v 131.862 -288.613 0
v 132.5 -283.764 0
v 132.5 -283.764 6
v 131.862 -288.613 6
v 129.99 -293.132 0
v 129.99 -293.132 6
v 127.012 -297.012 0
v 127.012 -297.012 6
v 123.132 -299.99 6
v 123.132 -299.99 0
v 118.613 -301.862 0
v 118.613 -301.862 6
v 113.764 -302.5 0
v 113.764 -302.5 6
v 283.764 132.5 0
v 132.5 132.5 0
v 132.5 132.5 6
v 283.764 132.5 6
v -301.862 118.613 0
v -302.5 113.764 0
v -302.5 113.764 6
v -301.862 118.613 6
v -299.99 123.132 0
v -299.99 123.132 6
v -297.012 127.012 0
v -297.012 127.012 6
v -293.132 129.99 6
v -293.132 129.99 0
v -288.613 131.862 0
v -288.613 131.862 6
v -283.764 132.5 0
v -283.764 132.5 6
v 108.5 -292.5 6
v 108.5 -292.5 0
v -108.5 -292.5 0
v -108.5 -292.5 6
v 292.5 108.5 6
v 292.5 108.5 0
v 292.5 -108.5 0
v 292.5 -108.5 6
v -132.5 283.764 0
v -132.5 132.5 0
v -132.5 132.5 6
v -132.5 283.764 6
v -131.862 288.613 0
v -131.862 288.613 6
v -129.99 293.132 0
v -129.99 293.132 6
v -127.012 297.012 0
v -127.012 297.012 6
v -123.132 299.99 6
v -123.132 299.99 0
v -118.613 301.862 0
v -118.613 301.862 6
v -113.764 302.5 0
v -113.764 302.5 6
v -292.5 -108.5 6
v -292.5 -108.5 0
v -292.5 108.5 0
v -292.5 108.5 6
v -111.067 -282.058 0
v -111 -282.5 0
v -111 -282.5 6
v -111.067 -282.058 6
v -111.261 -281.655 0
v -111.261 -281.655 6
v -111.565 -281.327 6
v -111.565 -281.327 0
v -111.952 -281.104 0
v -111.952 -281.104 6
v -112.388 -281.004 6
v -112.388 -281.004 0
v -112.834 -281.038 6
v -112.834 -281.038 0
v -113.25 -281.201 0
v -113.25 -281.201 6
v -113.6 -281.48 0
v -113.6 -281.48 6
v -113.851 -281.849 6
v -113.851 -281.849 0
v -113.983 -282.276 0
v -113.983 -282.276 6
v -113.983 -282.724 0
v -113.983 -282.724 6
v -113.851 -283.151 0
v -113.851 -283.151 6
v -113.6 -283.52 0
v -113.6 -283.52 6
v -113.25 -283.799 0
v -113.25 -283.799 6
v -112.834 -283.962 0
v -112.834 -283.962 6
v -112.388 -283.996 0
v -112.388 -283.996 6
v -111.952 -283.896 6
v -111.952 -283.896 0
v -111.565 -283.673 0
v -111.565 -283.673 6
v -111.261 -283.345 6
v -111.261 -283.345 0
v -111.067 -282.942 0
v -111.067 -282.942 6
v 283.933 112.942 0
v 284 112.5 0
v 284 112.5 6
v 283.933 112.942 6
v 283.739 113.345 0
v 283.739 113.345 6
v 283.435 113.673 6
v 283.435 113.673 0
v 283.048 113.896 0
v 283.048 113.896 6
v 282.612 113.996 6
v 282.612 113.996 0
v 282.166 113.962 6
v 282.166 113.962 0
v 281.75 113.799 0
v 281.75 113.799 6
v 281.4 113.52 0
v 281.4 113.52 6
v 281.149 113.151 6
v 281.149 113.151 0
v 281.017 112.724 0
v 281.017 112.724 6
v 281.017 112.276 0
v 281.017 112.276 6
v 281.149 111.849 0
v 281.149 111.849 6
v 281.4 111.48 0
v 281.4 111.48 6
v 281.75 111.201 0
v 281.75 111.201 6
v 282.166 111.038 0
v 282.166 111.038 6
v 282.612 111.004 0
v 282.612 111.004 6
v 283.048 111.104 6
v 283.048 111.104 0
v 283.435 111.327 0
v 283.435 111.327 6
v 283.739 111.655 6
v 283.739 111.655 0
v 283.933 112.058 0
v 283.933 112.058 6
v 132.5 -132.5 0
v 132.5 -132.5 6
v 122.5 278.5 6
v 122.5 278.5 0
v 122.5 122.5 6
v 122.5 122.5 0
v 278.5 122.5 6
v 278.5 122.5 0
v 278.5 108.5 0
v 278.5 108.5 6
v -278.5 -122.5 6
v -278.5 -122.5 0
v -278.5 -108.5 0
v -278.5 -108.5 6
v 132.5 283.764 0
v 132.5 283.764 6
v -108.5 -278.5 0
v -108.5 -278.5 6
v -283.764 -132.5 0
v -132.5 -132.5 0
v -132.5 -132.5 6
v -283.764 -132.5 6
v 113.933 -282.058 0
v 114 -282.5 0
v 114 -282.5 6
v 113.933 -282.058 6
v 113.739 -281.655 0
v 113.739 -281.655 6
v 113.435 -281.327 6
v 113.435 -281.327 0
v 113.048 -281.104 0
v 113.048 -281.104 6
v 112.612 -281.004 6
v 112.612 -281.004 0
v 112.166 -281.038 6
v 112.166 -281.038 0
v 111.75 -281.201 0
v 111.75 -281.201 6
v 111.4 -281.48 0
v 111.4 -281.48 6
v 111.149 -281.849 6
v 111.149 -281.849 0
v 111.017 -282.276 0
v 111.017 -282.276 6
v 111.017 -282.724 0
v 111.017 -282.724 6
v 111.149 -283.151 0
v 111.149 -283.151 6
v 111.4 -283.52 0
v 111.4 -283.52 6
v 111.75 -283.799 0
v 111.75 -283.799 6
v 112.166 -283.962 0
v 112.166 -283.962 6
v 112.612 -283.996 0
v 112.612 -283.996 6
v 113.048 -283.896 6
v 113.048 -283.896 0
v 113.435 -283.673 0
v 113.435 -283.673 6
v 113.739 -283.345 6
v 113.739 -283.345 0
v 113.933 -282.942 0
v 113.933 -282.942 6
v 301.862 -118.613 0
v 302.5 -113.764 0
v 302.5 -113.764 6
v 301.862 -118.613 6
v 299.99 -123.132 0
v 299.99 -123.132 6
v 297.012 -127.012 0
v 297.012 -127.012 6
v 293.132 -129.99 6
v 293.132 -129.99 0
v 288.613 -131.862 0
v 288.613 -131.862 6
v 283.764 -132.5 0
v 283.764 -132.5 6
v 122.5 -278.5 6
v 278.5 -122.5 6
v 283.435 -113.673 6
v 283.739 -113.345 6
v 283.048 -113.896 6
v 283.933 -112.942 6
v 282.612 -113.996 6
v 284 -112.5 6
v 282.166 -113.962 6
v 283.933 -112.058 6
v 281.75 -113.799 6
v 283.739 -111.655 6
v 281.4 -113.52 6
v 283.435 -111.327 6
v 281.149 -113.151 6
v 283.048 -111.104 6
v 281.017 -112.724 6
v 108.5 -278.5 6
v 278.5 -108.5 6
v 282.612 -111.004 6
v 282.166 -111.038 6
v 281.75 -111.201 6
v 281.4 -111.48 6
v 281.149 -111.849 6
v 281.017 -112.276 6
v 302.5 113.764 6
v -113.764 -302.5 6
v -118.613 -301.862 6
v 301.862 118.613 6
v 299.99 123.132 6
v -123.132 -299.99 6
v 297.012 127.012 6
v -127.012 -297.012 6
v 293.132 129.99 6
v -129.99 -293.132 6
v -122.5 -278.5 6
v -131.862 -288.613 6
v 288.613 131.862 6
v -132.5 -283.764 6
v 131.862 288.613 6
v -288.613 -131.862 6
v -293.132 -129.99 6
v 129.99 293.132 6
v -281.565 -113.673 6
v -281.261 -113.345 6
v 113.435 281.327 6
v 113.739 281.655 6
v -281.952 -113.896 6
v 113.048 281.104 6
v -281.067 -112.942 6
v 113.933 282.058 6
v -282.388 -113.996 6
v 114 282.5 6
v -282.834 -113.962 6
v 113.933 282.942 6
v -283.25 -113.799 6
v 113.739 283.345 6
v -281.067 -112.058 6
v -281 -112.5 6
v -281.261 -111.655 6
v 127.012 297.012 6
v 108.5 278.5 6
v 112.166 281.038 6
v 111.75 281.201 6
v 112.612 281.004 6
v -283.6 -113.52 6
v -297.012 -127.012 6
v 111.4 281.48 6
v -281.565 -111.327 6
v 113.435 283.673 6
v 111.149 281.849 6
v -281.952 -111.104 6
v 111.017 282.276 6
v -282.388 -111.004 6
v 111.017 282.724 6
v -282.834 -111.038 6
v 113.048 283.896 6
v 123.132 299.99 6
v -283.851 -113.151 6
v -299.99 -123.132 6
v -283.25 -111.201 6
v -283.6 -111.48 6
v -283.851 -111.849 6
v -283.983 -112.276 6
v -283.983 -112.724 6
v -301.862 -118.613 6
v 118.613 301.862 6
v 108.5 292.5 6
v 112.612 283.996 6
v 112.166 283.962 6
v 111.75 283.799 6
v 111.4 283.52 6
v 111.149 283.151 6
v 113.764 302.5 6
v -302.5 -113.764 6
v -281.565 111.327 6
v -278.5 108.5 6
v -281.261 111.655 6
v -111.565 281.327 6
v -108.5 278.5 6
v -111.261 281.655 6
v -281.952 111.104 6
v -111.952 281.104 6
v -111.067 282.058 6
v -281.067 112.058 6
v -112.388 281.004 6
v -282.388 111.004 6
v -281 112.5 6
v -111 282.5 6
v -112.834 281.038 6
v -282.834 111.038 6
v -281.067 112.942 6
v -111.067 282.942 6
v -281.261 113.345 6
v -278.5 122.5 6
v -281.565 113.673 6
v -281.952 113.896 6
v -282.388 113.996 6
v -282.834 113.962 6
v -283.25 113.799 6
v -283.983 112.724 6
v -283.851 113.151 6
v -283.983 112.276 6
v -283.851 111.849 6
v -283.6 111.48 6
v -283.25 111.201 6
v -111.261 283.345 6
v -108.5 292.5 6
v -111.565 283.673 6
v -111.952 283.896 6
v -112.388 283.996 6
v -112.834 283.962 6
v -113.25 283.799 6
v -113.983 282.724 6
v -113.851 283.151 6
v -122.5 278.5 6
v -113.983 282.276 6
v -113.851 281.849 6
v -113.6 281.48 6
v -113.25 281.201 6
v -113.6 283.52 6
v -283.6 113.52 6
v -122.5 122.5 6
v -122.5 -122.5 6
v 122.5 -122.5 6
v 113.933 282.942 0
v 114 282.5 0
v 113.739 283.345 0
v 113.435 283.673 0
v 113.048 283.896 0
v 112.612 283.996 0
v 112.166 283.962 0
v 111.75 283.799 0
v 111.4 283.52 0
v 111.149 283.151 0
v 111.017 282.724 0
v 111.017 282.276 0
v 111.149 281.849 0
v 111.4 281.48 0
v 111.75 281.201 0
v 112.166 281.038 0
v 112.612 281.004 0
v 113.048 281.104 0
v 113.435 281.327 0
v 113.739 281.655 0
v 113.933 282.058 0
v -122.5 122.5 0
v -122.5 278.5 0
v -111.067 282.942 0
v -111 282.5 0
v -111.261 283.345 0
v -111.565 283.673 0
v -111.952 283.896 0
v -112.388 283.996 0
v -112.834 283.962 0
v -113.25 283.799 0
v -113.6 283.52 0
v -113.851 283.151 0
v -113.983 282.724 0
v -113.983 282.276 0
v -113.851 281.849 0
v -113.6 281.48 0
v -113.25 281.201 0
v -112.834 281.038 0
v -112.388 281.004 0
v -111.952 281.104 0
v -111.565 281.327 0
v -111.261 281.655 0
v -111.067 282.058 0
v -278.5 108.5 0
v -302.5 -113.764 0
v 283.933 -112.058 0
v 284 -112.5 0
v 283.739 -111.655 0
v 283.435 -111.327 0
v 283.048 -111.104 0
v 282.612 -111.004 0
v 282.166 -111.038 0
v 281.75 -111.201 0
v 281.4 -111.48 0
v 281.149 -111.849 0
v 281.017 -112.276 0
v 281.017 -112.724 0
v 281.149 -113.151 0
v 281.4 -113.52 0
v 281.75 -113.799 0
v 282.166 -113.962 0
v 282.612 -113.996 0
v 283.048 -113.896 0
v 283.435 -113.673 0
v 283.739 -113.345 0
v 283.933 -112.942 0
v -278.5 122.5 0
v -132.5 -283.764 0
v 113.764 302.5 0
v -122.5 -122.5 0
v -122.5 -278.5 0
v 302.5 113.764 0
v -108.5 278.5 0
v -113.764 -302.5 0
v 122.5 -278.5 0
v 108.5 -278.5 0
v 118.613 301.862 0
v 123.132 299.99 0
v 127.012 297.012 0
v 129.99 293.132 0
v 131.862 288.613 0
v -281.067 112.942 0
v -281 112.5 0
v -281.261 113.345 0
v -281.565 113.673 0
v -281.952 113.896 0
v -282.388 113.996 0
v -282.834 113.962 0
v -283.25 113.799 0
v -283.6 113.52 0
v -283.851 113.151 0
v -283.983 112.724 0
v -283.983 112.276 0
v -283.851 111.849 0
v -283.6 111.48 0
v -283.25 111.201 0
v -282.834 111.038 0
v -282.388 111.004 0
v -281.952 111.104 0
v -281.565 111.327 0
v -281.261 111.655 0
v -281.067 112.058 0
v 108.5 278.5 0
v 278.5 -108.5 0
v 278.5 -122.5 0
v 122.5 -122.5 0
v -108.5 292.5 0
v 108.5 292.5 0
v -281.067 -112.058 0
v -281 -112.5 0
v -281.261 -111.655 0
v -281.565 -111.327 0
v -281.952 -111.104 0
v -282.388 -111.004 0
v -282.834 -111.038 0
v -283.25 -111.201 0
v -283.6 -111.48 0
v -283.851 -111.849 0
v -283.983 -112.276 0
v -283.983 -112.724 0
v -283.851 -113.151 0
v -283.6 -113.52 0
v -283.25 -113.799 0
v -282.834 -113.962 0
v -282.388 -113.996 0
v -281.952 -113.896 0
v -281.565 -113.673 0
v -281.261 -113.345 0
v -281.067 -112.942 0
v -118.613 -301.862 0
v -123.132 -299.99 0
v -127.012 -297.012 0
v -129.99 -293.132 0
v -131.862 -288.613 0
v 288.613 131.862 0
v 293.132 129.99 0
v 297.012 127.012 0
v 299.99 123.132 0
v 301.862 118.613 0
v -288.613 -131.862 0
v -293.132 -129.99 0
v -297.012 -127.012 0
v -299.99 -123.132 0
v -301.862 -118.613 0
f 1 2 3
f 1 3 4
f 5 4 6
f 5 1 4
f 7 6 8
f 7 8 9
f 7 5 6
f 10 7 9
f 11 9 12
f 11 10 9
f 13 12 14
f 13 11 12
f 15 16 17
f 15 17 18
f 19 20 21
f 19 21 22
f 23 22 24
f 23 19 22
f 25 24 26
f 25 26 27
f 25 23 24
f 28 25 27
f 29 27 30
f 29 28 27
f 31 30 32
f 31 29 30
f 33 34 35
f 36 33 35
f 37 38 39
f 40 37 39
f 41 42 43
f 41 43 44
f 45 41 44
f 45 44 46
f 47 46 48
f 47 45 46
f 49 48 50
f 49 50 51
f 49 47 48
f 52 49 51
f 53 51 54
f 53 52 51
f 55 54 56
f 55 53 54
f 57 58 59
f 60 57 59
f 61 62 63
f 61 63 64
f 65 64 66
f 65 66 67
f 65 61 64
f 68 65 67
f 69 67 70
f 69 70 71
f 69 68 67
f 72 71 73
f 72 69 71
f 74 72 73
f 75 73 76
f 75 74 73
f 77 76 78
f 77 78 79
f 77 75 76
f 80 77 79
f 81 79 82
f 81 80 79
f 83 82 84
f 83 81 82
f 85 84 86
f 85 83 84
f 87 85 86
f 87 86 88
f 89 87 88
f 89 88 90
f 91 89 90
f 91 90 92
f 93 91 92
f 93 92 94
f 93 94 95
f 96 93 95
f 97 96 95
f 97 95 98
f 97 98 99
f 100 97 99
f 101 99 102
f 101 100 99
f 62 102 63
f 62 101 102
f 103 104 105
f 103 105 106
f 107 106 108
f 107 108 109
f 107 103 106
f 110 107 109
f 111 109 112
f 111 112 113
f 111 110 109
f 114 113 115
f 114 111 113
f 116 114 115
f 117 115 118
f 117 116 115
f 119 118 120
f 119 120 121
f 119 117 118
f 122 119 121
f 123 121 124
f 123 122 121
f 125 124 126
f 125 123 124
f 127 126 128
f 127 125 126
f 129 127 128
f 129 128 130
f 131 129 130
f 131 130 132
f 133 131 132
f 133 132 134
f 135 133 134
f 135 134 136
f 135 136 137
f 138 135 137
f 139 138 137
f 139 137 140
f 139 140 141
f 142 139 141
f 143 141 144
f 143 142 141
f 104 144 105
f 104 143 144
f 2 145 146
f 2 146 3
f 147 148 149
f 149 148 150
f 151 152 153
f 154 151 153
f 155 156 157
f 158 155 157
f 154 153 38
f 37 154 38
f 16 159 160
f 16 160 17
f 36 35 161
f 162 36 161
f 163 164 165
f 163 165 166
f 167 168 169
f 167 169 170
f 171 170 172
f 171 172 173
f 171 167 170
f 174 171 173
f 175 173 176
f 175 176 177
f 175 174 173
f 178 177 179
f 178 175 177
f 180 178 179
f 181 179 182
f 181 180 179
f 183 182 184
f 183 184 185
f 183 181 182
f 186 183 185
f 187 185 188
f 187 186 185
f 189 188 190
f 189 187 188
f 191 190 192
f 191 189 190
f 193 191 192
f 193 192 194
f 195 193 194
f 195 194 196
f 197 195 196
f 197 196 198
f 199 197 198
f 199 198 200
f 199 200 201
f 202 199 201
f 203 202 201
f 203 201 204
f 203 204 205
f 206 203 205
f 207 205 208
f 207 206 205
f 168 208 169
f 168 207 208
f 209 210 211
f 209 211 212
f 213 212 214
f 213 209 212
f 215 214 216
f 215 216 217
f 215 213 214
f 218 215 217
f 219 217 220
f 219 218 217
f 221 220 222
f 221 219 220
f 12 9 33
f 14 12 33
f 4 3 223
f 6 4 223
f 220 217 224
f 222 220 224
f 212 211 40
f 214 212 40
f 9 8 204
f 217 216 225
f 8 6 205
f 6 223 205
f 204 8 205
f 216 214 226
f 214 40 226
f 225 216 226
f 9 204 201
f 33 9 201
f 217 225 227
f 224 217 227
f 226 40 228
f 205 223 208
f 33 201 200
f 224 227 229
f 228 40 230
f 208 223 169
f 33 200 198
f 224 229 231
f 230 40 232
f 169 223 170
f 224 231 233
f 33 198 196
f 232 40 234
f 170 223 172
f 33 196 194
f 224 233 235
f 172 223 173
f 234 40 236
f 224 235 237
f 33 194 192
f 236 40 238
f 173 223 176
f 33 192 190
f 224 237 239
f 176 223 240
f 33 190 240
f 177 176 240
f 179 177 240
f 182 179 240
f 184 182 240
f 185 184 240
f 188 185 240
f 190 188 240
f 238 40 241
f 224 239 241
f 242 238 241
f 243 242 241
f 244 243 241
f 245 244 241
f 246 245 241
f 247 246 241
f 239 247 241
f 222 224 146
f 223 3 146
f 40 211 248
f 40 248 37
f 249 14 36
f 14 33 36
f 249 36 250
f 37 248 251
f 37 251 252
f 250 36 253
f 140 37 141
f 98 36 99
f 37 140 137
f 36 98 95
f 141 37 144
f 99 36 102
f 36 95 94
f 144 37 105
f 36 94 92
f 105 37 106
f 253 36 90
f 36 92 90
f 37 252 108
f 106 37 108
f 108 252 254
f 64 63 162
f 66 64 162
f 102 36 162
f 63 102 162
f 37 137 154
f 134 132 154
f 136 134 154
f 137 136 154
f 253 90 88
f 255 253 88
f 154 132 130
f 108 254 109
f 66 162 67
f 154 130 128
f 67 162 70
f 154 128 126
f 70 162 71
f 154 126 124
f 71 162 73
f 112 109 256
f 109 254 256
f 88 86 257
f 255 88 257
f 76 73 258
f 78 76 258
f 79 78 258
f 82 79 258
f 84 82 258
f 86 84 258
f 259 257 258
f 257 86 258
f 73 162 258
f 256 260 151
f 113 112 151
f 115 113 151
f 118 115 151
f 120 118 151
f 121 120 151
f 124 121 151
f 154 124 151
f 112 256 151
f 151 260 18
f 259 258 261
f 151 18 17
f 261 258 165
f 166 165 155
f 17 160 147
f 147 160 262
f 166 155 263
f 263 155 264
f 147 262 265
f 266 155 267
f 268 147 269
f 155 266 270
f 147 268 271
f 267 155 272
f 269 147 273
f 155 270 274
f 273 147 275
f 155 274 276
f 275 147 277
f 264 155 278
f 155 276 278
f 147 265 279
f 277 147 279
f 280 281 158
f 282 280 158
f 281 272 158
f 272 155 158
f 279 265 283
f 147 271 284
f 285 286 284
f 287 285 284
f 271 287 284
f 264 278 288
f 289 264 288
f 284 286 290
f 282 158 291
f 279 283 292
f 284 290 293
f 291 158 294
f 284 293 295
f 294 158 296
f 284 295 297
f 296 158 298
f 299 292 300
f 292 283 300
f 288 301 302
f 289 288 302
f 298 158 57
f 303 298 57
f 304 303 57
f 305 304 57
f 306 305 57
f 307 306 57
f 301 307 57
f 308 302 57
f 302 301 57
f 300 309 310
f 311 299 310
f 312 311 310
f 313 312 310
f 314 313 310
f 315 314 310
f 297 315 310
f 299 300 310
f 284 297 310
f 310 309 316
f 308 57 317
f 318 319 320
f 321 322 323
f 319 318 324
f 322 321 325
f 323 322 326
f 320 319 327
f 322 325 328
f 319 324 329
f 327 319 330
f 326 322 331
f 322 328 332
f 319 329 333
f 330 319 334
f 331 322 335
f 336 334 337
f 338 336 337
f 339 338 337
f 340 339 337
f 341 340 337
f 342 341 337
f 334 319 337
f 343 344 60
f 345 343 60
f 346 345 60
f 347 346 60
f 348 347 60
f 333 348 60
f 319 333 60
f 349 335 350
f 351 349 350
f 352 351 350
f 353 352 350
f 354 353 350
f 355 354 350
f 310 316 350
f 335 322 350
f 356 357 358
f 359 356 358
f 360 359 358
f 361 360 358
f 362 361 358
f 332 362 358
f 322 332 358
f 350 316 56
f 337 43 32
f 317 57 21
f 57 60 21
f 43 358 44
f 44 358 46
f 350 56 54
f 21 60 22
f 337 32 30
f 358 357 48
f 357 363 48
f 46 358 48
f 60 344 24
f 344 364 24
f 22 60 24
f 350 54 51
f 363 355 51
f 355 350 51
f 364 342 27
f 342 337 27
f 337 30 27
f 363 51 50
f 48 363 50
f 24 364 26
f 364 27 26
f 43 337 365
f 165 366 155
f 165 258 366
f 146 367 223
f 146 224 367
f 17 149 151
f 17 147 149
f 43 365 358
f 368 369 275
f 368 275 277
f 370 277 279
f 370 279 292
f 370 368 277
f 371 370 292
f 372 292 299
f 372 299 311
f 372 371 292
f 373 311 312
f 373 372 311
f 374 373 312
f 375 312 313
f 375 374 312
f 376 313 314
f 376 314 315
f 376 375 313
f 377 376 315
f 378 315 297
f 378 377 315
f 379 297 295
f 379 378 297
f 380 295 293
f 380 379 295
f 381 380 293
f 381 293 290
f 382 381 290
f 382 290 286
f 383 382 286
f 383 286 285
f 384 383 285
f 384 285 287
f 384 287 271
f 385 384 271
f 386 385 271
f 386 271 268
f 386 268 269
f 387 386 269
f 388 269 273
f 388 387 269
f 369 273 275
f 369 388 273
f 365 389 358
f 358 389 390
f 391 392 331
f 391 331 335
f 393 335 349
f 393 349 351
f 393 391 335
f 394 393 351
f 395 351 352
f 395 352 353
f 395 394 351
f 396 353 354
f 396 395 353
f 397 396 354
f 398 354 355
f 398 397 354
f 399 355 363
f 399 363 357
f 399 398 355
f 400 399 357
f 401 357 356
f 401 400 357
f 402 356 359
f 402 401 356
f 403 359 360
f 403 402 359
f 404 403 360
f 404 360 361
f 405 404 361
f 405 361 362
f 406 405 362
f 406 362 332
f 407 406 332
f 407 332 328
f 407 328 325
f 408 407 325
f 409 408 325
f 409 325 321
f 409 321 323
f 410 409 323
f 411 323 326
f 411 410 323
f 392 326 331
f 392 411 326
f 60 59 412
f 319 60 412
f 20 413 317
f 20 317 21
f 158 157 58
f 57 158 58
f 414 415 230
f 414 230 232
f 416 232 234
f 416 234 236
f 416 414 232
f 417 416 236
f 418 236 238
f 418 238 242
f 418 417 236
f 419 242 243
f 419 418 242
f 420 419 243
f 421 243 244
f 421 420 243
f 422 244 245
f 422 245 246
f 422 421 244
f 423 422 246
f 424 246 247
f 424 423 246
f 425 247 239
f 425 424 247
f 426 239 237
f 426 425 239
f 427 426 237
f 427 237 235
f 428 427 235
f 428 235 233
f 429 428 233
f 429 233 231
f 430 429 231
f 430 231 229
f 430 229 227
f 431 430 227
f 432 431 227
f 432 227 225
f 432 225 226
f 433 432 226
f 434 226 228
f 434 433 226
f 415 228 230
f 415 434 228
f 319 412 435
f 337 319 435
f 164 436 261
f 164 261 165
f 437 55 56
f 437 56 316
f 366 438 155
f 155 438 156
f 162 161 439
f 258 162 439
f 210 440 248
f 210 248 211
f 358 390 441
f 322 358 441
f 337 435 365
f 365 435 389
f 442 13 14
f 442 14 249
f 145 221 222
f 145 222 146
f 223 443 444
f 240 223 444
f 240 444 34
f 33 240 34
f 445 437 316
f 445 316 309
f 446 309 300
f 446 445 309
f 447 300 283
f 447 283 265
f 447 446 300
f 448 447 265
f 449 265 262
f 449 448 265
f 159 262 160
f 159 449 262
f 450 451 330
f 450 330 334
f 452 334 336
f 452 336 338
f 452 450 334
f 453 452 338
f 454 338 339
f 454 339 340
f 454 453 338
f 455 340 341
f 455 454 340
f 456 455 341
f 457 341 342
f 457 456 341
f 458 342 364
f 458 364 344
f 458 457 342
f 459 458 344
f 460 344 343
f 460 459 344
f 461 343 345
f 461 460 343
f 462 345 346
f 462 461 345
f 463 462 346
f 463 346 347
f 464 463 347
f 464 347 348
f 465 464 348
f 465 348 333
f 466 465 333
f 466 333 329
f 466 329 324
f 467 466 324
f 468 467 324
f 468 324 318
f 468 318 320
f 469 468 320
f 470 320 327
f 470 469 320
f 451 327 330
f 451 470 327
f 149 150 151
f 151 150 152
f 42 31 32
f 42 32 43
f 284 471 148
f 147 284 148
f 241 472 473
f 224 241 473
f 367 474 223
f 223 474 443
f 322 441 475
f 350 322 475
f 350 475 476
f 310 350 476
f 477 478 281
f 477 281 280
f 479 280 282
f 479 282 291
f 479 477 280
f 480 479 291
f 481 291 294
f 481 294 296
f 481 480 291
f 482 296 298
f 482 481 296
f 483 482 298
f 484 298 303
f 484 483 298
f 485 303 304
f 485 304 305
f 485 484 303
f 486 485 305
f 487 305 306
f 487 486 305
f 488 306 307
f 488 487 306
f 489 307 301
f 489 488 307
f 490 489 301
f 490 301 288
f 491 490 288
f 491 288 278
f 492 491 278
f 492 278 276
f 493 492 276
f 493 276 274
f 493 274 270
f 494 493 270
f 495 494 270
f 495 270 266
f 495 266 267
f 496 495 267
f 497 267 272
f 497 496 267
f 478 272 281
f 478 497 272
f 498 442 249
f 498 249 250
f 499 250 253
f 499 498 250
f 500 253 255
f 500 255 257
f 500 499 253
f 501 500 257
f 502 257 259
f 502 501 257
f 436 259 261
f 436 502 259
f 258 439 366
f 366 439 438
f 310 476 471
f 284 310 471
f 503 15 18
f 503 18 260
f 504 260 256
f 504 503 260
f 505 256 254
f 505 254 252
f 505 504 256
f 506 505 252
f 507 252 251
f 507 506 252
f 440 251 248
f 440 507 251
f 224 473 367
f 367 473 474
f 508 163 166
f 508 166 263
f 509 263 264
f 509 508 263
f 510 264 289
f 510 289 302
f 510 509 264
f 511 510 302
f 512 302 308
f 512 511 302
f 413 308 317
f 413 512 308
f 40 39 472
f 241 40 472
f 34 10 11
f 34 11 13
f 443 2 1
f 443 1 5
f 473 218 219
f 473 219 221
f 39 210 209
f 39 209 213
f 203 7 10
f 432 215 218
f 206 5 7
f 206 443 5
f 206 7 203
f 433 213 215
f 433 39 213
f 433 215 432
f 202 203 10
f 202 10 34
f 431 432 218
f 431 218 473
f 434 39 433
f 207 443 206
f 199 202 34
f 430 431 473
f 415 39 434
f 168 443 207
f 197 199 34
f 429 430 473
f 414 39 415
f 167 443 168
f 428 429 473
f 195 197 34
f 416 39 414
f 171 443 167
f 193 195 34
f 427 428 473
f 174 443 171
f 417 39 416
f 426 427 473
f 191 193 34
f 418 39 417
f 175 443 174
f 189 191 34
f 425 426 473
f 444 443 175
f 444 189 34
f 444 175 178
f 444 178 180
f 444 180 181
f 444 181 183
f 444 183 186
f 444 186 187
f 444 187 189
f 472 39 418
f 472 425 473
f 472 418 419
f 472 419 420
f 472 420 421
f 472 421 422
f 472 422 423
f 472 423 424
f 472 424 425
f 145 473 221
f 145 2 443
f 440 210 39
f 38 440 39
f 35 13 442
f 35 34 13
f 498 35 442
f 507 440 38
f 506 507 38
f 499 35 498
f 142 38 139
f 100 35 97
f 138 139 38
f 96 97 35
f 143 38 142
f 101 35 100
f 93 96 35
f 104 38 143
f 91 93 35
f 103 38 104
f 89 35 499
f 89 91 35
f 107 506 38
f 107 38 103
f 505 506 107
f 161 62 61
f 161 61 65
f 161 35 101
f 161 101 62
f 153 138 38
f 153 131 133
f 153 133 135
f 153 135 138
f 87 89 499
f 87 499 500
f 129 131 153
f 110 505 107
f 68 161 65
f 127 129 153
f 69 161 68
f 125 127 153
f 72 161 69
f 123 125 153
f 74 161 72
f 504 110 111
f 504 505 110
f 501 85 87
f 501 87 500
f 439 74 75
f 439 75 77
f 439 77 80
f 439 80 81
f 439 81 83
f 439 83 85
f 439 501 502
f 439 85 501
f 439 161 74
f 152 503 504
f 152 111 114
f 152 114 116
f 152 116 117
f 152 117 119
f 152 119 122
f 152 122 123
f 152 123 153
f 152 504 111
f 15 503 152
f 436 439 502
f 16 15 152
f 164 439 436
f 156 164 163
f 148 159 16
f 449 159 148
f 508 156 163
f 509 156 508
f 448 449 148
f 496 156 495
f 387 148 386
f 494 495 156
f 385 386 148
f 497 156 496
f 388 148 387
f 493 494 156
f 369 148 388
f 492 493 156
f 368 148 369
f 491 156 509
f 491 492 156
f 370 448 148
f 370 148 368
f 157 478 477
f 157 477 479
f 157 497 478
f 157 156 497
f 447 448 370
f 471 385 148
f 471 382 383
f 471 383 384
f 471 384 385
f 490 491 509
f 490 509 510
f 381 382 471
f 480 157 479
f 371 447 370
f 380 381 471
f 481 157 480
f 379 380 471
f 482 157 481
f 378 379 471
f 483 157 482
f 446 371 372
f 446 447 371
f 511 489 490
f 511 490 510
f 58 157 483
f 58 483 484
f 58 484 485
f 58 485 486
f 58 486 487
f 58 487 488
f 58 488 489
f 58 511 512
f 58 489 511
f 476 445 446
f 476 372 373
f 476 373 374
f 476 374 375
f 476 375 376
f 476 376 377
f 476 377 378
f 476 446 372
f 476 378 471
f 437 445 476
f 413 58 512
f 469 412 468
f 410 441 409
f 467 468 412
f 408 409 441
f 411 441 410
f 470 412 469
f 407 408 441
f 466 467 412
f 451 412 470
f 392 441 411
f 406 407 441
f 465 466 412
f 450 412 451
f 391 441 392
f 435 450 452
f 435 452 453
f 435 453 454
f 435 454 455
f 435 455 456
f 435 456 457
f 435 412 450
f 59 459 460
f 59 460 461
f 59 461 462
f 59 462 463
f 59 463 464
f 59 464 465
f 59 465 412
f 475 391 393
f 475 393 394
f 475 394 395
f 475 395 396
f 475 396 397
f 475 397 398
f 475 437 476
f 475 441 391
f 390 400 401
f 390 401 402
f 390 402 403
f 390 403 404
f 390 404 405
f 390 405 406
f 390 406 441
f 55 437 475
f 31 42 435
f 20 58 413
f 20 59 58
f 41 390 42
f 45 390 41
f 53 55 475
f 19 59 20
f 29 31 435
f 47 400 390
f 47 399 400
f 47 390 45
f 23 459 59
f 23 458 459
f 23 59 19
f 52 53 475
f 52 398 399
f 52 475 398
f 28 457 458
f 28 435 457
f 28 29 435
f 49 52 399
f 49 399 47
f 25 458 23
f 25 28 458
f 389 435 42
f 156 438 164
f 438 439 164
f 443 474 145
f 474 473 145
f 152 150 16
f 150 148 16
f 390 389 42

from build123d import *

# Parameters (mm, degrees)
CROQUIS1_R              = 1.5
SALIENTE_EXTRUIR1_DEPTH = 6


with BuildPart() as part:
    # Croquis1 → Saliente-Extruir1 (new body)
    with BuildSketch(Plane.XY):
        with BuildLine():
            Line((-283.764, 132.5), (-132.5, 132.5))
            Line((-132.5, 132.5), (-132.5, 283.764))
            ThreePointArc((-132.5, 283.764), (-127.012352652, 297.012352652), (-113.764, 302.5))
            Line((-113.764, 302.5), (113.764, 302.5))
            ThreePointArc((113.764, 302.5), (127.012352652, 297.012352652), (132.5, 283.764))
            Line((132.5, 283.764), (132.5, 132.5))
            Line((132.5, 132.5), (283.764, 132.5))
            ThreePointArc((283.764, 132.5), (297.012352652, 127.012352652), (302.5, 113.764))
            Line((302.5, 113.764), (302.5, -113.764))
            ThreePointArc((302.5, -113.764), (297.012352652, -127.012352652), (283.764, -132.5))
            Line((283.764, -132.5), (132.5, -132.5))
            Line((132.5, -132.5), (132.5, -283.764))
            ThreePointArc((132.5, -283.764), (127.012352652, -297.012352652), (113.764, -302.5))
            Line((113.764, -302.5), (-113.764, -302.5))
            ThreePointArc((-113.764, -302.5), (-127.012352652, -297.012352652), (-132.5, -283.764))
            Line((-132.5, -283.764), (-132.5, -132.5))
            Line((-132.5, -132.5), (-283.764, -132.5))
            ThreePointArc((-283.764, -132.5), (-297.012352652, -127.012352652), (-302.5, -113.764))
            Line((-302.5, -113.764), (-302.5, 113.764))
            ThreePointArc((-302.5, 113.764), (-297.012352652, 127.012352652), (-283.764, 132.5))
        make_face()
        with Locations((-282.5, 112.5)):
            Circle(CROQUIS1_R, mode=Mode.SUBTRACT)
        with Locations((-282.5, -112.5)):
            Circle(CROQUIS1_R, mode=Mode.SUBTRACT)
        with Locations((-112.5, -282.5)):
            Circle(CROQUIS1_R, mode=Mode.SUBTRACT)
        with Locations((112.5, -282.5)):
            Circle(CROQUIS1_R, mode=Mode.SUBTRACT)
        with Locations((282.5, -112.5)):
            Circle(CROQUIS1_R, mode=Mode.SUBTRACT)
        with Locations((282.5, 112.5)):
            Circle(CROQUIS1_R, mode=Mode.SUBTRACT)
        with Locations((-112.5, 282.5)):
            Circle(CROQUIS1_R, mode=Mode.SUBTRACT)
        with Locations((112.5, 282.5)):
            Circle(CROQUIS1_R, mode=Mode.SUBTRACT)
        Polygon((-278.5, 122.5), (-122.5, 122.5), (-122.5, 278.5), (-108.5, 278.5), (-108.5, 292.5), (108.5, 292.5), (108.5, 278.5), (122.5, 278.5), (122.5, 122.5), (278.5, 122.5), (278.5, 108.5), (292.5, 108.5), (292.5, -108.5), (278.5, -108.5), (278.5, -122.5), (122.5, -122.5), (122.5, -278.5), (108.5, -278.5), (108.5, -292.5), (-108.5, -292.5), (-108.5, -278.5), (-122.5, -278.5), (-122.5, -122.5), (-278.5, -122.5), (-278.5, -108.5), (-292.5, -108.5), (-292.5, 108.5), (-278.5, 108.5), align=None, mode=Mode.SUBTRACT)
    extrude(amount=SALIENTE_EXTRUIR1_DEPTH)


solid = part.part
